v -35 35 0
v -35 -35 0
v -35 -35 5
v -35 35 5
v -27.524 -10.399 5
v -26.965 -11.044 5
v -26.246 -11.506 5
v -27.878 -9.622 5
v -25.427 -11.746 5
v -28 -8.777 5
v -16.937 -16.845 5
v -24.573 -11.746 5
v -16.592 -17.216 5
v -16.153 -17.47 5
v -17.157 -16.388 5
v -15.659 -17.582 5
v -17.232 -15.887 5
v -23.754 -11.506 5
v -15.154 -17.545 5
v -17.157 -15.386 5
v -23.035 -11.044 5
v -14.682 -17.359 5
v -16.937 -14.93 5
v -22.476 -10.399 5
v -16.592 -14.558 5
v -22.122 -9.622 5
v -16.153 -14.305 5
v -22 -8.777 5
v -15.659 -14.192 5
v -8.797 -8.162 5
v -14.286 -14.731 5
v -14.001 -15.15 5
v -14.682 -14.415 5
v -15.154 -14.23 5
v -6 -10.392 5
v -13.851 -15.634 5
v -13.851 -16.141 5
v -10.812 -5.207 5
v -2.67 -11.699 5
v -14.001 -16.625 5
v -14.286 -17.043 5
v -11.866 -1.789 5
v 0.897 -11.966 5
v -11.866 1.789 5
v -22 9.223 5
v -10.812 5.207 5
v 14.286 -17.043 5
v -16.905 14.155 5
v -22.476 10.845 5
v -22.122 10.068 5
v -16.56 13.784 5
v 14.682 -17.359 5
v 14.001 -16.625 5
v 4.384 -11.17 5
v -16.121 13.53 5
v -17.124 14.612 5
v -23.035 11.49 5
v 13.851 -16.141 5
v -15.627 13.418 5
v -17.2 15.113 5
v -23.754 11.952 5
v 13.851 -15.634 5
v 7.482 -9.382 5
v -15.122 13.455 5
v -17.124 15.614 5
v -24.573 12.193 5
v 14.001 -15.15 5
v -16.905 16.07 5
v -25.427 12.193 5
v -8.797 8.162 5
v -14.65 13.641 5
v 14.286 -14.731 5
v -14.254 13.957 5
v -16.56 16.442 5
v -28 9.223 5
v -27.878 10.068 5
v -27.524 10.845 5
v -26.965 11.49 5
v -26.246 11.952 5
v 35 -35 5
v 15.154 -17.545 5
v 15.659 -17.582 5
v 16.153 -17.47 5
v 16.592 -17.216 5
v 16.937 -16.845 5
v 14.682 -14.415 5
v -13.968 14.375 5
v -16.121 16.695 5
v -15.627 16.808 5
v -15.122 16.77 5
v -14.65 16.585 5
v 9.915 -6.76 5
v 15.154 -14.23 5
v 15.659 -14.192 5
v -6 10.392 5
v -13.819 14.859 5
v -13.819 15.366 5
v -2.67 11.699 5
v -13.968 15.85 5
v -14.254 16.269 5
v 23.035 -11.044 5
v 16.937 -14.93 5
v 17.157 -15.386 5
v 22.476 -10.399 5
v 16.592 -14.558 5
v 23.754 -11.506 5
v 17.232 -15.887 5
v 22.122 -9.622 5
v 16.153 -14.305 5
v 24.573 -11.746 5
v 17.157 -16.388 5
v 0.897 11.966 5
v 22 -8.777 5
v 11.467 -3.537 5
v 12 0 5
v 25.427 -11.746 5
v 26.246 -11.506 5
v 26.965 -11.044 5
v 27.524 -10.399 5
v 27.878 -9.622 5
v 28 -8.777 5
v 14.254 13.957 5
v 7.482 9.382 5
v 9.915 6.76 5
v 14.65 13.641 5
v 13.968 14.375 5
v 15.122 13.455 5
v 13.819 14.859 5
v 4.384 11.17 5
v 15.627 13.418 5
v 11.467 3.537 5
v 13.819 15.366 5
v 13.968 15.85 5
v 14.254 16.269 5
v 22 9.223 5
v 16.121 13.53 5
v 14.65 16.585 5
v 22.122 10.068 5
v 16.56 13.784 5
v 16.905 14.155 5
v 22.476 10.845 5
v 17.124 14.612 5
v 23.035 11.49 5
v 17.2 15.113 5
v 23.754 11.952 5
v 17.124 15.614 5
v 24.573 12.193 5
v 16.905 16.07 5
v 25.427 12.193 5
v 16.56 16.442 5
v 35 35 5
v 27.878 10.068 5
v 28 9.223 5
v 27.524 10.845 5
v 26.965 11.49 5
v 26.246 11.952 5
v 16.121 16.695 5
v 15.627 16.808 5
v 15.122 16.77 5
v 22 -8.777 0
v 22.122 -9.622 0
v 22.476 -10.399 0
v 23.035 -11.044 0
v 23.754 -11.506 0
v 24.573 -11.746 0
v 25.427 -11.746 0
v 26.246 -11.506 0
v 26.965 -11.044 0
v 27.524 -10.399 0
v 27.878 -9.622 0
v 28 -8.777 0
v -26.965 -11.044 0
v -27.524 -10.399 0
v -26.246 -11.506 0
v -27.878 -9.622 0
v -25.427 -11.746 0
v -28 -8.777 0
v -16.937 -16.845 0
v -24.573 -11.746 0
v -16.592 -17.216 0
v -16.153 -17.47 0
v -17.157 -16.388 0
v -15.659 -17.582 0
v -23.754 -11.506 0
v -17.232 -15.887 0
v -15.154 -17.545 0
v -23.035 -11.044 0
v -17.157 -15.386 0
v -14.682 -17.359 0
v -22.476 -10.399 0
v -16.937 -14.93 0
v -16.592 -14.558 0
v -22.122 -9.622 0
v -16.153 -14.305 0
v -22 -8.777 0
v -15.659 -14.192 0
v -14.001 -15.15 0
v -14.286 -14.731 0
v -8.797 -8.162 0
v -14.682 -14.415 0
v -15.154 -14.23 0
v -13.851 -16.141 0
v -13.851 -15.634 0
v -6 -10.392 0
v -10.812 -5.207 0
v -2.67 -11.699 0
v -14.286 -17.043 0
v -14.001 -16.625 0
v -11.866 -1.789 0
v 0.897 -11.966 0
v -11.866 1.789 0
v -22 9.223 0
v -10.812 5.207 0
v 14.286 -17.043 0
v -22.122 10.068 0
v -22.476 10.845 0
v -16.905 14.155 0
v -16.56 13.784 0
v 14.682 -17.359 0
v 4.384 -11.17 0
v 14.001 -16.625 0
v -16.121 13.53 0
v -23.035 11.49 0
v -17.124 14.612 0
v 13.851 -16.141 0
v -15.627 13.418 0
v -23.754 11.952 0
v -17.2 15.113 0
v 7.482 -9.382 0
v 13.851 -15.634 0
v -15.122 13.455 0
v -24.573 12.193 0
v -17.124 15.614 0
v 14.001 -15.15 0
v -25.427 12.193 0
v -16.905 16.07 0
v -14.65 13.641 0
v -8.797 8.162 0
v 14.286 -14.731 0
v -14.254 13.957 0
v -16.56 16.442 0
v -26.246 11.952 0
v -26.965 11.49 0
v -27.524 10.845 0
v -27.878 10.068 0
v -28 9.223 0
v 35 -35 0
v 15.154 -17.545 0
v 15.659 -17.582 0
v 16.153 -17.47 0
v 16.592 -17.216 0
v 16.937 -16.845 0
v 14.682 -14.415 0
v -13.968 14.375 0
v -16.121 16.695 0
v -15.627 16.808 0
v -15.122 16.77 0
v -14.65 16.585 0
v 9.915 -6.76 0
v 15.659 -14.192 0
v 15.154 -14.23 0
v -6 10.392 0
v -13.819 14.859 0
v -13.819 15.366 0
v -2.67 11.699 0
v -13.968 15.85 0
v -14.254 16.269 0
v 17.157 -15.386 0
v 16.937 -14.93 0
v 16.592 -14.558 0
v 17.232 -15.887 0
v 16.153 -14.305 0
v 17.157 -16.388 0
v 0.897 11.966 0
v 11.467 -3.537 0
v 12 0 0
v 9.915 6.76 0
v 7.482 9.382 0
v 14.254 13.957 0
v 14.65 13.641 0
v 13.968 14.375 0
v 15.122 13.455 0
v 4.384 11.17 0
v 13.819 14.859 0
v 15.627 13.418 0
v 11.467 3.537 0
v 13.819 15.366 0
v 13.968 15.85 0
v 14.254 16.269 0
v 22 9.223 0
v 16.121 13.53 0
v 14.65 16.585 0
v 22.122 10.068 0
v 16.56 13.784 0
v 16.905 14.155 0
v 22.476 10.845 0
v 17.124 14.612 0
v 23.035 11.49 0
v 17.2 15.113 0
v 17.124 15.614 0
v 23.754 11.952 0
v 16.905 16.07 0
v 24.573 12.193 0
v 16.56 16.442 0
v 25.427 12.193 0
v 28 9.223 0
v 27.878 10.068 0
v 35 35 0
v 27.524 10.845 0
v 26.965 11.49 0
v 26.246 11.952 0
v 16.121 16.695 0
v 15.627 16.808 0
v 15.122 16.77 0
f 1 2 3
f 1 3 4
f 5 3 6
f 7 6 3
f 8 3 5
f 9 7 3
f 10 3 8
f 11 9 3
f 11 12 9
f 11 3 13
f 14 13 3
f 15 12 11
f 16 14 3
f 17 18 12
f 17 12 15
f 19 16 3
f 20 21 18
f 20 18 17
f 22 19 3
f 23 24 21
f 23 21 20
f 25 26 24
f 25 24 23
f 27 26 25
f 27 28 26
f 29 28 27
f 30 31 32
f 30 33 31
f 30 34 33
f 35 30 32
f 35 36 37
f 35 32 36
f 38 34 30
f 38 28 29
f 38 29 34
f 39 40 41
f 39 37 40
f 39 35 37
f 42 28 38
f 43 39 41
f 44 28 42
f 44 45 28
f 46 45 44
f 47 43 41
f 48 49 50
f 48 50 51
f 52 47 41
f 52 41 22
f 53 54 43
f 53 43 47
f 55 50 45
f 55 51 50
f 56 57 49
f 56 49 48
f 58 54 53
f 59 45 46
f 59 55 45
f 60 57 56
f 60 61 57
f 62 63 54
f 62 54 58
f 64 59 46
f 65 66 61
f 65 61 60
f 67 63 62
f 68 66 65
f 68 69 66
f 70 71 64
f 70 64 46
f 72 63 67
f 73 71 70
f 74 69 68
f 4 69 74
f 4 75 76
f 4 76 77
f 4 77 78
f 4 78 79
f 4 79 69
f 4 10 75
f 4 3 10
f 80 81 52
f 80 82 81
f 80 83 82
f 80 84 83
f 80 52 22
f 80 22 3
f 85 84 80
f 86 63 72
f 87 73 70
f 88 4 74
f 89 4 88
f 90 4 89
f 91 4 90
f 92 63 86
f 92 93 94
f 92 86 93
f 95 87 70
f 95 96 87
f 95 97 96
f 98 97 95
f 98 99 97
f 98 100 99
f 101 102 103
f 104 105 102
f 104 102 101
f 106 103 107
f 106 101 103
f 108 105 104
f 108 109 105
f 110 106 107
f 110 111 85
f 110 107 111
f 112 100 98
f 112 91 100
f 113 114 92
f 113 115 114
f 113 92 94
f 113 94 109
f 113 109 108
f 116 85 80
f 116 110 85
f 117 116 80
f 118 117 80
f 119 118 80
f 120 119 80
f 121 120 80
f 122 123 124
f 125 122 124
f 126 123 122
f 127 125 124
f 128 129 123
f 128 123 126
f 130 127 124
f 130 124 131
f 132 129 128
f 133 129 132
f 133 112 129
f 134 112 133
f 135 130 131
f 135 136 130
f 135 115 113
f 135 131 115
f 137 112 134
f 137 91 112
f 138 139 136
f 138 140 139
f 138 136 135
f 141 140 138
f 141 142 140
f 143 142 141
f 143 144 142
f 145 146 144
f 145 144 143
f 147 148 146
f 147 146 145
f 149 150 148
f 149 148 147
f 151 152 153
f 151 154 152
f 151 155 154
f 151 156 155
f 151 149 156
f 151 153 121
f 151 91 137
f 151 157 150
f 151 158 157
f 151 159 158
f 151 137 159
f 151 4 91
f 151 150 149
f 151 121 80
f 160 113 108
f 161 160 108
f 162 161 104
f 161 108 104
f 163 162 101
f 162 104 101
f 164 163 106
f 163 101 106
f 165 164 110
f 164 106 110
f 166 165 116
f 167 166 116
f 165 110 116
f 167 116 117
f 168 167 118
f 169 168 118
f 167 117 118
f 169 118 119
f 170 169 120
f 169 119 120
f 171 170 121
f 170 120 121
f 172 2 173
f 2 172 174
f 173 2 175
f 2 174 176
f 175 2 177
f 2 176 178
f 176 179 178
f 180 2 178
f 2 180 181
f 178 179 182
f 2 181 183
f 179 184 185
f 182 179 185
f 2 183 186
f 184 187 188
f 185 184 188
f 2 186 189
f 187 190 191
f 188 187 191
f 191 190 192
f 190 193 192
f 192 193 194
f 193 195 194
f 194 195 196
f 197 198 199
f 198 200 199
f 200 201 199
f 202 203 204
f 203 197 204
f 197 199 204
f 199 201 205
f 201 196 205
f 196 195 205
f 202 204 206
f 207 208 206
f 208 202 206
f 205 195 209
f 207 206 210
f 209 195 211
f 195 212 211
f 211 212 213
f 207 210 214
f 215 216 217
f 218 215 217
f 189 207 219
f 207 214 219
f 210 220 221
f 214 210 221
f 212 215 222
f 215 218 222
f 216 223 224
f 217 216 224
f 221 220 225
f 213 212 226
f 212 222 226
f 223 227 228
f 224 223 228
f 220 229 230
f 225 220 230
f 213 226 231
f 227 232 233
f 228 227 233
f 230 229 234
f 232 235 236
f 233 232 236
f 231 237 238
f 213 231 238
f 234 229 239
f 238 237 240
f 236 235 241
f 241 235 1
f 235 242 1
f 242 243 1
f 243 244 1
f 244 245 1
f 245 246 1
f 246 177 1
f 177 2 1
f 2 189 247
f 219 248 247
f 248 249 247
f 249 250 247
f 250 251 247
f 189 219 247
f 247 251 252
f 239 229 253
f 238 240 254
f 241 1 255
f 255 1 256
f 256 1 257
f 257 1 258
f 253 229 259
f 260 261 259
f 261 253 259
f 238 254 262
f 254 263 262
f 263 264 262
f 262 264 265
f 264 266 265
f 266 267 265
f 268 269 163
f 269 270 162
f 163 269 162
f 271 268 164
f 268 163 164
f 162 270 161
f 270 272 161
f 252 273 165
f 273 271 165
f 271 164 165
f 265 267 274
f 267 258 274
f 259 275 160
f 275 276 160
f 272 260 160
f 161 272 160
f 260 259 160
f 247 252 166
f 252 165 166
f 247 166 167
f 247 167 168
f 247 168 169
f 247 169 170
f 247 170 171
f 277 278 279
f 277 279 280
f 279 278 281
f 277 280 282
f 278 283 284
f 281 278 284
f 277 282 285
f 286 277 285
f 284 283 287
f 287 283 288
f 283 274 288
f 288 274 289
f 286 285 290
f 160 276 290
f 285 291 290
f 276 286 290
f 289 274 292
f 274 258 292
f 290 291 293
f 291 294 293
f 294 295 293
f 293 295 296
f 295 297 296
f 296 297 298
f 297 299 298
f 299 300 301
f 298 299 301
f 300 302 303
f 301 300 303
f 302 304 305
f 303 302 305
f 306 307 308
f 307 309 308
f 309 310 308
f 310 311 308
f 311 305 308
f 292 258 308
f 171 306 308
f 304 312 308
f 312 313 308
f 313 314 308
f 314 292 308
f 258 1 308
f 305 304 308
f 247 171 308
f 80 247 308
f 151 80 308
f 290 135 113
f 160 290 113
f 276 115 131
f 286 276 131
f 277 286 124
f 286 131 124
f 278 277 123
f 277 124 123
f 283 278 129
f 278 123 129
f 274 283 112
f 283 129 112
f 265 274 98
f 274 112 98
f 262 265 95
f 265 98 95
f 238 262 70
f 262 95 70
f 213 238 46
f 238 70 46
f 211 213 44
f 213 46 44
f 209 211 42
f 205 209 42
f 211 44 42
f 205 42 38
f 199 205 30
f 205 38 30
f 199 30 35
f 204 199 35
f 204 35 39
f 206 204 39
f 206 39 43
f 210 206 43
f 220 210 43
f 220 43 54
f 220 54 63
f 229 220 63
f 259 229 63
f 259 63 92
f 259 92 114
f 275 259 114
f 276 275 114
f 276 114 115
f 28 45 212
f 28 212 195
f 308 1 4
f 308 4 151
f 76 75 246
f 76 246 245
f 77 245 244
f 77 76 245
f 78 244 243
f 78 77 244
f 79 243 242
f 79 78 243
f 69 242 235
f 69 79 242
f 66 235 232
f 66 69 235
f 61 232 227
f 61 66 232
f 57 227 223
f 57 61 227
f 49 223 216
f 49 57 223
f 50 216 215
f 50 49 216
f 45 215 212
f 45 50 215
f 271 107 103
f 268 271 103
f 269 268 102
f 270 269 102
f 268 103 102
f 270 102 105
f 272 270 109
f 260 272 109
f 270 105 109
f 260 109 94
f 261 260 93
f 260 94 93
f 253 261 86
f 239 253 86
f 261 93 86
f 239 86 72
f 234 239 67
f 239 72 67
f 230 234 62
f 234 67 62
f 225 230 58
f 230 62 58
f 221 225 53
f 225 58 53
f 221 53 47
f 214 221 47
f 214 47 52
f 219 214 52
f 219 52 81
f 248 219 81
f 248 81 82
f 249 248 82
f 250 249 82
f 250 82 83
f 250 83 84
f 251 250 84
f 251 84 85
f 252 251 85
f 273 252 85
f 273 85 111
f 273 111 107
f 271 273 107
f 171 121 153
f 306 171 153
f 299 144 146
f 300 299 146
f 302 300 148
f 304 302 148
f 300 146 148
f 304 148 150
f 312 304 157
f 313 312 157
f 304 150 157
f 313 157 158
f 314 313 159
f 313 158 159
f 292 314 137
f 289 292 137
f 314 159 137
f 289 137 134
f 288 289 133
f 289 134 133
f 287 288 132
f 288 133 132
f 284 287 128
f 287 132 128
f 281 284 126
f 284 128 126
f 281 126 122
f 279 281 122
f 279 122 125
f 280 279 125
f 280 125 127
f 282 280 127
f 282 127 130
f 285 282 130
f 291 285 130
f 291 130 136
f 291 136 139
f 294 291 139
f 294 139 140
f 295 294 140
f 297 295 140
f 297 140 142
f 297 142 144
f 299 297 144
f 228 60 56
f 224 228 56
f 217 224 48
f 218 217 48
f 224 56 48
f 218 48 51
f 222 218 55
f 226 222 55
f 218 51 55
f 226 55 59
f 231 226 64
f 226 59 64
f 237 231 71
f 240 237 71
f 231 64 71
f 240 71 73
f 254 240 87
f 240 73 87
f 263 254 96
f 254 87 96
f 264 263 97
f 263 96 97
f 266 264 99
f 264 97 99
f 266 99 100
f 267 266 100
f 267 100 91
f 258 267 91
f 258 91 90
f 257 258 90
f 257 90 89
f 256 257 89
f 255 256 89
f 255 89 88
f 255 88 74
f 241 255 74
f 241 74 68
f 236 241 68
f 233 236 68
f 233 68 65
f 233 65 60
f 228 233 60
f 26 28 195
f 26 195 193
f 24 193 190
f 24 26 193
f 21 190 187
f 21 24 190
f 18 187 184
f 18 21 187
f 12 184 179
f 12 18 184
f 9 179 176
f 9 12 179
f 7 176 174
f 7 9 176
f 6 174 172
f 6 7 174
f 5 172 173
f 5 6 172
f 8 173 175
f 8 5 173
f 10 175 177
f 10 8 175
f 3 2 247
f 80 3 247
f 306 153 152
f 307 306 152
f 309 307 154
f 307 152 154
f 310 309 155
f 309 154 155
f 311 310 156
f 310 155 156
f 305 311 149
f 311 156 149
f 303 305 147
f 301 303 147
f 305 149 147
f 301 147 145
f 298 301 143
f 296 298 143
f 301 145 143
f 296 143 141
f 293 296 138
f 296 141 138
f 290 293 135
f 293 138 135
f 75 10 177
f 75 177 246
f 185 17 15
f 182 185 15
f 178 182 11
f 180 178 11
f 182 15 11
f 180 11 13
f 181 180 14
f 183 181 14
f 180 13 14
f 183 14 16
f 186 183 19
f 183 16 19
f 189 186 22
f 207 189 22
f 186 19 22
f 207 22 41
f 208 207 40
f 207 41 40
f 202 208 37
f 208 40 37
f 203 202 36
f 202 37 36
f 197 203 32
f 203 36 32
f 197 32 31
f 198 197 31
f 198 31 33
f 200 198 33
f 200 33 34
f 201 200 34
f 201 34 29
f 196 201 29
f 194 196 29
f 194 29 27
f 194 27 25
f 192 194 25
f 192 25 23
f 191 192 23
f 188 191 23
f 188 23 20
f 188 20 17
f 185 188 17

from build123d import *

# Parameters (mm, degrees)
SKETCH1_W           = 70
SKETCH1_H           = 70
BOSS_EXTRUDE1_DEPTH = 5
SKETCH2_R           = 12
SKETCH2_R_2         = 1.7
CUT_EXTRUDE6_DEPTH  = 50.749371855
CUT_EXTRUDE7_DEPTH  = 50.749371855


with BuildPart() as part:
    # Sketch1 → Boss-Extrude1 (new body)
    with BuildSketch(Plane.XY):
        Rectangle(SKETCH1_W, SKETCH1_H)
    extrude(amount=BOSS_EXTRUDE1_DEPTH)

    # Sketch2 → Cut-Extrude6 (cut, through all)
    with BuildSketch(Plane.XY.offset(5)):
        Circle(SKETCH2_R)
        with Locations((15.5, 15.112797807)):
            Circle(SKETCH2_R_2)
        with Locations((15.532292635, -15.887185373)):
            Circle(SKETCH2_R_2)
        with Locations(Location((-15.532292635, -15.887185373, 0), (0, 0, 180))):
            Circle(SKETCH2_R_2)
        with Locations(Location((-15.5, 15.112797807, 0), (0, 0, 180))):
            Circle(SKETCH2_R_2)
    extrude(amount=-CUT_EXTRUDE6_DEPTH, mode=Mode.SUBTRACT)

    # Sketch3 → Cut-Extrude7 (cut, through all)
    with BuildSketch(Plane.XY.offset(5)):
        with BuildLine():
            Line((-22, 9.22322481), (-22, -8.77677519))
            ThreePointArc((-22, -8.77677519), (-25, -11.77677519), (-28, -8.77677519))
            Line((-28, -8.77677519), (-28, 9.22322481))
            ThreePointArc((-28, 9.22322481), (-25, 12.22322481), (-22, 9.22322481))
        make_face()
        with BuildLine():
            Line((22, 9.22322481), (22, -8.77677519))
            ThreePointArc((22, -8.77677519), (25, -11.77677519), (28, -8.77677519))
            Line((28, -8.77677519), (28, 9.22322481))
            ThreePointArc((28, 9.22322481), (25, 12.22322481), (22, 9.22322481))
        make_face()
    extrude(amount=-CUT_EXTRUDE7_DEPTH, mode=Mode.SUBTRACT)


solid = part.part
